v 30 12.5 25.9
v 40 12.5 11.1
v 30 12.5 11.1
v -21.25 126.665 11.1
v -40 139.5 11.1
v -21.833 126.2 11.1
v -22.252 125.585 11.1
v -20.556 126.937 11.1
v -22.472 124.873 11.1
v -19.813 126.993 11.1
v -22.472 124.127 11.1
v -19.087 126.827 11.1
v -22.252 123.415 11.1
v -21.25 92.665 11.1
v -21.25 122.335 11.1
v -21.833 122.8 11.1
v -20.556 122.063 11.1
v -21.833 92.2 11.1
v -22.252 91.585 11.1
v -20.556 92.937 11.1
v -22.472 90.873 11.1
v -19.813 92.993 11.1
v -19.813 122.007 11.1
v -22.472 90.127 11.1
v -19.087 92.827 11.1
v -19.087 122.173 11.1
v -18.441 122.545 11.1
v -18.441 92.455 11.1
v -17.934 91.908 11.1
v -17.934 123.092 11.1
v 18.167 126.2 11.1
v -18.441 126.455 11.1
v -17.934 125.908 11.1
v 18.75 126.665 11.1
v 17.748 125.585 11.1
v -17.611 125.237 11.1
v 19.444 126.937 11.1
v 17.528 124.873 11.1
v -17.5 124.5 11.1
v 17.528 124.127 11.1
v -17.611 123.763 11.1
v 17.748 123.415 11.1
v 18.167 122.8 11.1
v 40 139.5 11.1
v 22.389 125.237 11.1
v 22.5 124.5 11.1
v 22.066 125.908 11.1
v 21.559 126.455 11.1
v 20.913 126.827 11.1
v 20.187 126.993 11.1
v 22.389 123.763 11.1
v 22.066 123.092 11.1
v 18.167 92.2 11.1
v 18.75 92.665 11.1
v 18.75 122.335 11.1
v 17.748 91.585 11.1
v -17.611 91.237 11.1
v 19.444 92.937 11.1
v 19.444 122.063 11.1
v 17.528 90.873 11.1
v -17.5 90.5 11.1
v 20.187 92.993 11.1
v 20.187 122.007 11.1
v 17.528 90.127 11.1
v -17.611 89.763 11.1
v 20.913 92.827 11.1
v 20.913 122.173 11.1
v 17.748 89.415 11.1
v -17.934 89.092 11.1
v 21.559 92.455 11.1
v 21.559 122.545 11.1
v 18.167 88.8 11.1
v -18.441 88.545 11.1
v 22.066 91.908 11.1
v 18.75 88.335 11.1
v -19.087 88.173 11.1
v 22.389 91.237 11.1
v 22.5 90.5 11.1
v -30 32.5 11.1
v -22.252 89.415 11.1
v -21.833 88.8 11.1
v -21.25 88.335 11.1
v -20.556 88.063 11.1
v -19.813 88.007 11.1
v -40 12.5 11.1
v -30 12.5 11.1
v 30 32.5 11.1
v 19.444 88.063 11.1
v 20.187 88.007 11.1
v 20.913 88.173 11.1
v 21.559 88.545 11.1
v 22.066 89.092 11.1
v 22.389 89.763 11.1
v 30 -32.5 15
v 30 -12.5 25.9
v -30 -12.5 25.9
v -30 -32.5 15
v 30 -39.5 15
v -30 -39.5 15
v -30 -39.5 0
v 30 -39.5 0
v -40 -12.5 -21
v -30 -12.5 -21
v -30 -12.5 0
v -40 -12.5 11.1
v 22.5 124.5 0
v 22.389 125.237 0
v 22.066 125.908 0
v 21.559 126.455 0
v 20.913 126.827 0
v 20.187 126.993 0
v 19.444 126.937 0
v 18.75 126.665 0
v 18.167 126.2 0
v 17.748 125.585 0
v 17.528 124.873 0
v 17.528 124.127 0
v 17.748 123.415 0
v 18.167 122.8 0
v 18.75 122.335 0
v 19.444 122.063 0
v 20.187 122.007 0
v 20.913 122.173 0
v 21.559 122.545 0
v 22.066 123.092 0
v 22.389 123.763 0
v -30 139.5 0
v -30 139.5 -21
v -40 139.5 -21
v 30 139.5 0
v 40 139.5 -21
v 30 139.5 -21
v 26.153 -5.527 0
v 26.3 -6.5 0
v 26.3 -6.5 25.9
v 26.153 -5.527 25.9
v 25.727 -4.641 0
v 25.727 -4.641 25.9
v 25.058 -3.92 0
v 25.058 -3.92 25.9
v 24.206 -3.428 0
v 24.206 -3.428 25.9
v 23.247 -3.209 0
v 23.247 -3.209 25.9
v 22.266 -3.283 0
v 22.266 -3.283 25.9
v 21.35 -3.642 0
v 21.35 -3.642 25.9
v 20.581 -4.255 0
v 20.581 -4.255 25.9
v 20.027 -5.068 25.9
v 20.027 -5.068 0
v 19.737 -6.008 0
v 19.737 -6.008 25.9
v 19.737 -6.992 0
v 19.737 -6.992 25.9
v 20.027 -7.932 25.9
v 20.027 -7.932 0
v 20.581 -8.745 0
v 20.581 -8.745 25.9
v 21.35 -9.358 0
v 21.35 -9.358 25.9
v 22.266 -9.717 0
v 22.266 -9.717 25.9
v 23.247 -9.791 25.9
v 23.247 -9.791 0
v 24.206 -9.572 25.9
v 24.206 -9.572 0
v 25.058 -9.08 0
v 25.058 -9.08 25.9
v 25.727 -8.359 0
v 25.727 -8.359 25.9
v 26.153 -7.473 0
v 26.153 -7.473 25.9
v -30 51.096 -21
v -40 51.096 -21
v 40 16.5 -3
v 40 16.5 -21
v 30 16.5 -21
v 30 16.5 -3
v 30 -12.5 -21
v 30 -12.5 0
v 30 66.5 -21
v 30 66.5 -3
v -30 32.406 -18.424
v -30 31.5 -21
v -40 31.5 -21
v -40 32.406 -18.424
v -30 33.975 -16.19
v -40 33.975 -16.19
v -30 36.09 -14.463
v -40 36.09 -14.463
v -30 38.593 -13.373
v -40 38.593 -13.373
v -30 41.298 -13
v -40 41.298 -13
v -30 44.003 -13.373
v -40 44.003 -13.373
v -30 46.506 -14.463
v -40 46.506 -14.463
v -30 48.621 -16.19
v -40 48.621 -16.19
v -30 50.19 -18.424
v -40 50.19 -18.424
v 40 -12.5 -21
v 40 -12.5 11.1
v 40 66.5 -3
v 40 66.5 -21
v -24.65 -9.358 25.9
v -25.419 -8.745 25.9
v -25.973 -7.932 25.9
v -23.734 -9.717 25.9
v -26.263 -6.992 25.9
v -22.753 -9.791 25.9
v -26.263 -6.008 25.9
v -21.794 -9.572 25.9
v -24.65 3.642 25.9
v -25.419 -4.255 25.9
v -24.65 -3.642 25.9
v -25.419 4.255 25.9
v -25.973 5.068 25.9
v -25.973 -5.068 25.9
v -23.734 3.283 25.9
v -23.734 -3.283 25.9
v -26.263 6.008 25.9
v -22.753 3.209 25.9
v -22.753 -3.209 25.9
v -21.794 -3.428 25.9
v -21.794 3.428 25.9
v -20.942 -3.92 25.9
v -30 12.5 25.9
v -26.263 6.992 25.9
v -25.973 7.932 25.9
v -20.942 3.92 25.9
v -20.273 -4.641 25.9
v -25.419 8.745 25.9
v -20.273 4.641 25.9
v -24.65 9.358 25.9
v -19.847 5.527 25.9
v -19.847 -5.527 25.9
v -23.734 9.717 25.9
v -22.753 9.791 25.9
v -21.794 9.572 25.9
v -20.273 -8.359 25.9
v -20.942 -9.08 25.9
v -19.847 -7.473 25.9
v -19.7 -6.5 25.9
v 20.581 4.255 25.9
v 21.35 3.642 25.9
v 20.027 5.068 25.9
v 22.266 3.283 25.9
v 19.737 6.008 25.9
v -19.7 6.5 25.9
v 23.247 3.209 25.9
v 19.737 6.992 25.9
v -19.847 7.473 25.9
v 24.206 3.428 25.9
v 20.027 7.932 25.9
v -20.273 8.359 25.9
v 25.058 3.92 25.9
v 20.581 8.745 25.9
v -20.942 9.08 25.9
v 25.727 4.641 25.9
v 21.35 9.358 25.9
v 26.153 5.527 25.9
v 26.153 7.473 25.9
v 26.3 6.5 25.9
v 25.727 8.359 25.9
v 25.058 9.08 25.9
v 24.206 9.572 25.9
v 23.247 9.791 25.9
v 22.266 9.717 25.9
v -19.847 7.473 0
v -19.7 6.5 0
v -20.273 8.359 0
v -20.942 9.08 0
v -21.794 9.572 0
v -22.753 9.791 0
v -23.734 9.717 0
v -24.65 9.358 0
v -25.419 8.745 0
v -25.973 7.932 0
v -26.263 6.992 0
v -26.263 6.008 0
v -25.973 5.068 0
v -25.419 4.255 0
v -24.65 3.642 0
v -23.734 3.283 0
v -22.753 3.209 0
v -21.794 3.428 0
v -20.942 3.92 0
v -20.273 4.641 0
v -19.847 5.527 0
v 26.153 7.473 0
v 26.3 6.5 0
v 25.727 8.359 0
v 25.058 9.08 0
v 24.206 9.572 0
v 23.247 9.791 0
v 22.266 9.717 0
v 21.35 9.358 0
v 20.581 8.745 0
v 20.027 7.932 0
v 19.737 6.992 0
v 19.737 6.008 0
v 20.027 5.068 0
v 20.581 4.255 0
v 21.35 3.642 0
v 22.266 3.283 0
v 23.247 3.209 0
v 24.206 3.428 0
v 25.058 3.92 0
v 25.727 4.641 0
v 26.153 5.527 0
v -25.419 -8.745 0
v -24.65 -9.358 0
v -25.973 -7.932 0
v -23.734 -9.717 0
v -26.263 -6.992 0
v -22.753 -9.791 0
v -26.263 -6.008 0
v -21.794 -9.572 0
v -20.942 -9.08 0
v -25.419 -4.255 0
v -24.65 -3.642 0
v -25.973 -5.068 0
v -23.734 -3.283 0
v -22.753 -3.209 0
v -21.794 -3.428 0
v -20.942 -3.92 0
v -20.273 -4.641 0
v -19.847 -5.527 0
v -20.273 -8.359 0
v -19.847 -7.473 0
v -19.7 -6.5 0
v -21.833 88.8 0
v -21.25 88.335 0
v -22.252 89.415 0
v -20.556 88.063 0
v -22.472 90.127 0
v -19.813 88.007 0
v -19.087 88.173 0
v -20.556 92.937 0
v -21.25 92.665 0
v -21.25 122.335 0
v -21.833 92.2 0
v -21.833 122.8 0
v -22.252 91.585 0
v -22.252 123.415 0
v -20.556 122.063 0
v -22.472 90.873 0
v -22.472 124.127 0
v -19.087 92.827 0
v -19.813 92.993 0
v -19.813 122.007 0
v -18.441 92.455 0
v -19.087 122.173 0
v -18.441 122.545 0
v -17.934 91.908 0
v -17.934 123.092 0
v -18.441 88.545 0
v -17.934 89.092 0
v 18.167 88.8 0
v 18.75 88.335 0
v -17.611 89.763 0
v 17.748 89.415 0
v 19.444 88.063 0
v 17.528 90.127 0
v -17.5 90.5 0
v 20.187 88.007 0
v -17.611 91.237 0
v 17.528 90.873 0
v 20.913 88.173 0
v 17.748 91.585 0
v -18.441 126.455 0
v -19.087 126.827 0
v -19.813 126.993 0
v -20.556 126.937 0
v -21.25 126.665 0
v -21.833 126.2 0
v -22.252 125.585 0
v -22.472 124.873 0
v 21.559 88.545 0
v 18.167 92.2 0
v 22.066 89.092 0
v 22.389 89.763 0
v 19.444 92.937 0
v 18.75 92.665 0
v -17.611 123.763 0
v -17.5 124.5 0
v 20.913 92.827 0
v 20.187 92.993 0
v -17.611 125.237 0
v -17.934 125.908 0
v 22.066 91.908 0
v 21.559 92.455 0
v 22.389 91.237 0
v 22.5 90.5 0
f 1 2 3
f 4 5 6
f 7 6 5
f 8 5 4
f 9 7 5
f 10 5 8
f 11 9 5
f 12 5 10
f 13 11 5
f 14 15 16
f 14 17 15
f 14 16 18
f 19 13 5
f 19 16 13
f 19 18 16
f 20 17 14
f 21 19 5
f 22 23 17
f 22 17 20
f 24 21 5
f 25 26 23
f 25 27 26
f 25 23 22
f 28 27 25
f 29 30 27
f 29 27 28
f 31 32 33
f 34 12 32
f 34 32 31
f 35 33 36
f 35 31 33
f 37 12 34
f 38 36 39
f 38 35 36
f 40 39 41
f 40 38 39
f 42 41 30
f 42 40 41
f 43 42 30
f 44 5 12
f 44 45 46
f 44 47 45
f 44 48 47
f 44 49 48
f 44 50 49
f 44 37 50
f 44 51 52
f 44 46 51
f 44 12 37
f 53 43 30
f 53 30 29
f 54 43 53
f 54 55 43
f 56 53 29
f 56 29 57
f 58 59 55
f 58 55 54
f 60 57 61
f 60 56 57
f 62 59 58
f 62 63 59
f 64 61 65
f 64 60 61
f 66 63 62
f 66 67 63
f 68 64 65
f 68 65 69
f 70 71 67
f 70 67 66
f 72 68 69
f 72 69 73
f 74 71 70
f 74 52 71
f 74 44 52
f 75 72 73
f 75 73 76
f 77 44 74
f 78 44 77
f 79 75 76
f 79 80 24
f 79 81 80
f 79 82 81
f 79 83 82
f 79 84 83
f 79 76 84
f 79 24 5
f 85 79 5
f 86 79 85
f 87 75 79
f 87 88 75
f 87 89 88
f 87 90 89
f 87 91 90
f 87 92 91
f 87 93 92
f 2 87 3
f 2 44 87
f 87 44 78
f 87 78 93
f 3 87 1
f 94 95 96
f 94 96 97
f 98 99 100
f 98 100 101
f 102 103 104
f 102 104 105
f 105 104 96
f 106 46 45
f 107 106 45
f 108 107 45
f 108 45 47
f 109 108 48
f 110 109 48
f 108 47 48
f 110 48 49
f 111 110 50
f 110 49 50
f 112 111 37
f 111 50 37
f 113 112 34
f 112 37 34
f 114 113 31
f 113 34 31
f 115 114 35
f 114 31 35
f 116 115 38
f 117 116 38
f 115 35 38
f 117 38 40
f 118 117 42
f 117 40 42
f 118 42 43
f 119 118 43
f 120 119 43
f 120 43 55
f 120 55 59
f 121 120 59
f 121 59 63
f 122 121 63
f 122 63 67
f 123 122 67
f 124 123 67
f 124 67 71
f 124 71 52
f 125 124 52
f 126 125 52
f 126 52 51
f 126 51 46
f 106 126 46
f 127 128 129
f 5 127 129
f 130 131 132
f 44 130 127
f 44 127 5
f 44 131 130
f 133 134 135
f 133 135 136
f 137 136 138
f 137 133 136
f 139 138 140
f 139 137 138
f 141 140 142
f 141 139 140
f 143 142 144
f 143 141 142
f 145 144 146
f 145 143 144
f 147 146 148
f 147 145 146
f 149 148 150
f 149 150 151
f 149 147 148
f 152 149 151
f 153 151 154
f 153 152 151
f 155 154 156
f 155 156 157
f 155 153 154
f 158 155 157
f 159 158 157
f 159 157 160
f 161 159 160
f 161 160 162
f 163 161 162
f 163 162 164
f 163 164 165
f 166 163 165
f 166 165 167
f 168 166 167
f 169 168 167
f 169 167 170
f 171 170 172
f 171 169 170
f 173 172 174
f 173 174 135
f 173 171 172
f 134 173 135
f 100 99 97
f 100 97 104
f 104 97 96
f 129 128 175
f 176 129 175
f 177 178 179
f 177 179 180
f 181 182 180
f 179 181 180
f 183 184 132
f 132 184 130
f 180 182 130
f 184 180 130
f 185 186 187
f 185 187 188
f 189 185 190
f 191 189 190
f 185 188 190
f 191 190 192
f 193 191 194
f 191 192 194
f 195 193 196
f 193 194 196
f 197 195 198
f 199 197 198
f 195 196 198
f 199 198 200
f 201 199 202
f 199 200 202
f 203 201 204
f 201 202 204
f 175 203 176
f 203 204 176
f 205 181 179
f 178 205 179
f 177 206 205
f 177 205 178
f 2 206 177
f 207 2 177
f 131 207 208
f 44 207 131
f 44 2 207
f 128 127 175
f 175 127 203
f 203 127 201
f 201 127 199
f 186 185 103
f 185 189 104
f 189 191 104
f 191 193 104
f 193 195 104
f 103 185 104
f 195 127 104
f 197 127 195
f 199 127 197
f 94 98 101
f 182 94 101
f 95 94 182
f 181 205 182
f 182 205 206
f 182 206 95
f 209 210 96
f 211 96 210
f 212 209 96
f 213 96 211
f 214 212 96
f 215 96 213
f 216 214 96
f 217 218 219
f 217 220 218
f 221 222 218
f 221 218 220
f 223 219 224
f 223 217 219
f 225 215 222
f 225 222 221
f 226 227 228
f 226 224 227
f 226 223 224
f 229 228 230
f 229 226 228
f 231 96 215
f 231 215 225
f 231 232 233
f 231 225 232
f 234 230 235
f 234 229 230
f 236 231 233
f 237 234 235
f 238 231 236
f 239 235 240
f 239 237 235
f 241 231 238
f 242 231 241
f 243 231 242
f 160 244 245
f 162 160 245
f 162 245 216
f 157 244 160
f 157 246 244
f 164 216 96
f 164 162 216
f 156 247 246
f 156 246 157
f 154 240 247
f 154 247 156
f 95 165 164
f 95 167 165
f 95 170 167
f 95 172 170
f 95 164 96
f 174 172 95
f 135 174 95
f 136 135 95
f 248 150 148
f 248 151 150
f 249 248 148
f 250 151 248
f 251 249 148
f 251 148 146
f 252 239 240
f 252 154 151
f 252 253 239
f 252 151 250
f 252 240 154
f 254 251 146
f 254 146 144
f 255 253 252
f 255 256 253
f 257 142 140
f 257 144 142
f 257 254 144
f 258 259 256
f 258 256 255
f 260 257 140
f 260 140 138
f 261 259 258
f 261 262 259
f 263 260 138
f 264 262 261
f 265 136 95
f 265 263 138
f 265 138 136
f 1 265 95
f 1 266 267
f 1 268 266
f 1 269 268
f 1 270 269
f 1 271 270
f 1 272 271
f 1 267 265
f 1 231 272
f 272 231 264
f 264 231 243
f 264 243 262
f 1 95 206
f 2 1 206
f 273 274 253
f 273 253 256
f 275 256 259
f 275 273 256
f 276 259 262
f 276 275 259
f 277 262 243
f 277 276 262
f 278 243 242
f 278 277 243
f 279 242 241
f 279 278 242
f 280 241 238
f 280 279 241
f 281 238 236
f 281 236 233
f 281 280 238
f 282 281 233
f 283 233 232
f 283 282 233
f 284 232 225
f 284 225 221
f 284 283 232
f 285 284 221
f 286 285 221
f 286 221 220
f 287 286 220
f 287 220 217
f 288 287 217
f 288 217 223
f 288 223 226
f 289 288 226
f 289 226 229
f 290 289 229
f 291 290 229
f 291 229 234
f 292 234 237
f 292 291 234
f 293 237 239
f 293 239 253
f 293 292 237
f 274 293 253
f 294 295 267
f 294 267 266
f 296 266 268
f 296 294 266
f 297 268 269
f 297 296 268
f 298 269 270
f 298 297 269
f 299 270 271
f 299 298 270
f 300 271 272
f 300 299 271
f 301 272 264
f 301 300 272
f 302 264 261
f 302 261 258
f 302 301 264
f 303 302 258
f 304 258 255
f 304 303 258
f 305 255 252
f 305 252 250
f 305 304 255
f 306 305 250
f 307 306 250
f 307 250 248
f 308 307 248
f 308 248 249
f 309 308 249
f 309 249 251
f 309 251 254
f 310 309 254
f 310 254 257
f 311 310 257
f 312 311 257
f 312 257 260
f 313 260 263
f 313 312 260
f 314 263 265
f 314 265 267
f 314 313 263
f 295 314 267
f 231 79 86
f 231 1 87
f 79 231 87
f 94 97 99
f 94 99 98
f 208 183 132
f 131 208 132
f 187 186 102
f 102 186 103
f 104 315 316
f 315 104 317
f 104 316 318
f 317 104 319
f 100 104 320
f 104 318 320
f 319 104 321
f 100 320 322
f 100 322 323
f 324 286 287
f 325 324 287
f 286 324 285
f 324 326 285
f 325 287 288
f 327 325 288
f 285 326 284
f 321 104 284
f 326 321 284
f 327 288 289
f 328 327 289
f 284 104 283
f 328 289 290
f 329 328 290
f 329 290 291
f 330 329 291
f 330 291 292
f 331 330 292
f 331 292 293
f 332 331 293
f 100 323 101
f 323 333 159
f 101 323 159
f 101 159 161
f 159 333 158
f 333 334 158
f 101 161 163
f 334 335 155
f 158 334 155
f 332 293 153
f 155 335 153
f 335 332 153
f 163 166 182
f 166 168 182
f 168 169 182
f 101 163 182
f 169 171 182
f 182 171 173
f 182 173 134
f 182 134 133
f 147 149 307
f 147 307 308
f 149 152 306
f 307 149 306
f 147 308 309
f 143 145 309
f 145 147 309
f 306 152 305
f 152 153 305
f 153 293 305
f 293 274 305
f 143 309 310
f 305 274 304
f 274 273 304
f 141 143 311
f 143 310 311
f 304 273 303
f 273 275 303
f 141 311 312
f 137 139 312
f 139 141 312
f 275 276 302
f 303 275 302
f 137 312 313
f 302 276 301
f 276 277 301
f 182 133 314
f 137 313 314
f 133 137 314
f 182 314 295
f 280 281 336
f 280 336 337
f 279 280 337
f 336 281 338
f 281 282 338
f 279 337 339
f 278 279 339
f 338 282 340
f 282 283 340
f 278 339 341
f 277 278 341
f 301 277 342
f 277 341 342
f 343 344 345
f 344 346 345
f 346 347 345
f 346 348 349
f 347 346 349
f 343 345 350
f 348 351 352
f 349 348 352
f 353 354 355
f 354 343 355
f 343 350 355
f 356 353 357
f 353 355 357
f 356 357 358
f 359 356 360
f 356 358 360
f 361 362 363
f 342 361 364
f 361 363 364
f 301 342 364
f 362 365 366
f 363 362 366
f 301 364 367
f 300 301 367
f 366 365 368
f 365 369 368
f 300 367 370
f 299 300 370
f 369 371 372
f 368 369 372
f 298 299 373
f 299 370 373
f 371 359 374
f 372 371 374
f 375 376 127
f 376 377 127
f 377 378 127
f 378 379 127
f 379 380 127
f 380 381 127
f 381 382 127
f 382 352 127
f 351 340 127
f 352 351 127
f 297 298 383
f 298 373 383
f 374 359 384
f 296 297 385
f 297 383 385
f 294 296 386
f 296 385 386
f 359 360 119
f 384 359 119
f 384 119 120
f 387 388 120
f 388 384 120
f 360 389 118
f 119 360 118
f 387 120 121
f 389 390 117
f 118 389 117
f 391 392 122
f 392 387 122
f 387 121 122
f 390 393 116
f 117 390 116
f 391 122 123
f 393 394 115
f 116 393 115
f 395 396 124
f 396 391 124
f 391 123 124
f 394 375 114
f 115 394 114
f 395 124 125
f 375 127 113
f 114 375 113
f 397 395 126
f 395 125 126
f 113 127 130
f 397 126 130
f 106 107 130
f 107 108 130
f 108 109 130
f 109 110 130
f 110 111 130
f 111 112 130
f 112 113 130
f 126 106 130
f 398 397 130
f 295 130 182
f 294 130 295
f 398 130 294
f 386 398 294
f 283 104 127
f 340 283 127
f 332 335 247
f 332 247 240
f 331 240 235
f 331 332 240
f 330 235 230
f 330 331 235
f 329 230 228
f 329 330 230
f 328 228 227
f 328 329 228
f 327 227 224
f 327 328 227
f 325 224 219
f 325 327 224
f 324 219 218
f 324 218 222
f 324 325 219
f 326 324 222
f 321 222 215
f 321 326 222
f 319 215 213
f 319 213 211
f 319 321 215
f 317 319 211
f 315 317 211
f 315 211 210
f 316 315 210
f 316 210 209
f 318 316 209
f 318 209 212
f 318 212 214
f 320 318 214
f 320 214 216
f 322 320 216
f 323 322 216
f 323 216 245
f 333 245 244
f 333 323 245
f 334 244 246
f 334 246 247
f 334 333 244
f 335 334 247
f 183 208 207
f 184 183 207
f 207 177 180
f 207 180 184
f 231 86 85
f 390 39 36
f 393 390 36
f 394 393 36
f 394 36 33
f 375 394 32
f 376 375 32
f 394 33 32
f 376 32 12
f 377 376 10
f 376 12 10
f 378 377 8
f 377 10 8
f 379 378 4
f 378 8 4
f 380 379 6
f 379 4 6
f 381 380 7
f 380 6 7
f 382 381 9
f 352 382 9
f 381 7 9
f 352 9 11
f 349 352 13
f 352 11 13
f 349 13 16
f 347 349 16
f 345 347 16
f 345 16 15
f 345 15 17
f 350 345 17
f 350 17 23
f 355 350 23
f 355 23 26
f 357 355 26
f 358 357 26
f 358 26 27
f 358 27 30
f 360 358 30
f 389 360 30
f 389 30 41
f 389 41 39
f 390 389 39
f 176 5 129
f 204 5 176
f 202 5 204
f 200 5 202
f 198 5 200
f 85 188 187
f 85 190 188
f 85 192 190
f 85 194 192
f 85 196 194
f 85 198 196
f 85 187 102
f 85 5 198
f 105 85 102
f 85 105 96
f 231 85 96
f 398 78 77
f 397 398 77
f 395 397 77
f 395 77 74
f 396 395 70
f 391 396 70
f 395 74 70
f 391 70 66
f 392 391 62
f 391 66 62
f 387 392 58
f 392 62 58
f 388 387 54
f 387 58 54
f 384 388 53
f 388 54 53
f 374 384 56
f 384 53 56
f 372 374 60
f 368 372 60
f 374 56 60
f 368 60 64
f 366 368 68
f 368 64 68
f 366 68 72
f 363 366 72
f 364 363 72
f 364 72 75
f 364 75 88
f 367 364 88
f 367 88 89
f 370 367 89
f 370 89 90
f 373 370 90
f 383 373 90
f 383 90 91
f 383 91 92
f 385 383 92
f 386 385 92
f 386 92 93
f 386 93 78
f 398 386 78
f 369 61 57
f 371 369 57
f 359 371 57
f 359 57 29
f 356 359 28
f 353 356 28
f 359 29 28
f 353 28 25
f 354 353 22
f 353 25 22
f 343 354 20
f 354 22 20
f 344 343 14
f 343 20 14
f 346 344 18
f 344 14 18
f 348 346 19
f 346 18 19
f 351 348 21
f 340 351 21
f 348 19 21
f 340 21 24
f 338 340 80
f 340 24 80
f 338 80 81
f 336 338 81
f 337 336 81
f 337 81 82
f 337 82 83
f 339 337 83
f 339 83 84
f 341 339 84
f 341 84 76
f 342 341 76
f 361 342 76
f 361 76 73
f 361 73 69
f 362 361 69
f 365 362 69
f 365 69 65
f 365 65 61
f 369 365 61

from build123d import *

# Parameters (mm, degrees)
SKETCH_W        = 60
SKETCH_H        = 25
SKETCH_R        = 3.3
PAD_DEPTH       = 25.9
SKETCH001_W     = 60
SKETCH001_H     = 11.1
PAD001_DEPTH    = 127
SKETCH002_R     = 2.5
POCKET_DEPTH    = 11.101
PAD002_DEPTH    = 60
SKETCH004_W     = 152
SKETCH004_H     = 32.1
PAD003_DEPTH    = 10
SKETCH005_W     = 152
SKETCH005_H     = 32.1
PAD004_DEPTH    = 10
PAD005_DEPTH    = 25
SKETCH007_W     = 50
SKETCH007_H     = 18
POCKET001_DEPTH = 10
POCKET002_DEPTH = 10
SKETCH009_W     = 60
SKETCH009_H     = 15
PAD006_DEPTH    = 27
PAD007_DEPTH    = 60


with BuildPart() as part:
    # Sketch → Pad (new body)
    with BuildSketch(Plane.XY):
        Rectangle(SKETCH_W, SKETCH_H)
        with Locations((-23, 6.5)):
            Circle(SKETCH_R, mode=Mode.SUBTRACT)
        with Locations((-23, -6.5)):
            Circle(SKETCH_R, mode=Mode.SUBTRACT)
        with Locations((23, -6.5)):
            Circle(SKETCH_R, mode=Mode.SUBTRACT)
        with Locations((23, 6.5)):
            Circle(SKETCH_R, mode=Mode.SUBTRACT)
    extrude(amount=PAD_DEPTH)

    # Sketch001 (on Face1 of Pad) → Pad001 (join)
    with BuildSketch(Plane(origin=(0, 12.5, 0), x_dir=(-1, 0, 0), z_dir=(0, 1, 0))):
        with Locations((0, 5.55)):
            Rectangle(SKETCH001_W, SKETCH001_H)
    extrude(amount=PAD001_DEPTH)

    # Sketch002 (on Face2 of Pad001) → Pocket (cut, through all)
    with BuildSketch(Plane.XY.offset(11.1)):
        with Locations((-20, 124.5)):
            Circle(SKETCH002_R)
        with Locations((20, 124.5)):
            Circle(SKETCH002_R)
        with Locations((-20, 90.5)):
            Circle(SKETCH002_R)
        with Locations((20, 90.5)):
            Circle(SKETCH002_R)
    extrude(amount=-POCKET_DEPTH, mode=Mode.SUBTRACT)

    # Sketch003 (on Face6 of Pocket) → Pad002 (join)
    with BuildSketch(Plane.YZ.offset(30)):
        Polygon((12.5, 25.9), (32.5, 11.1), (12.5, 0), align=None)
    extrude(amount=-PAD002_DEPTH)

    # Sketch004 (on Face7 of Pad002) → Pad003 (join)
    with BuildSketch(Plane.YZ.offset(30)):
        with Locations((63.5, -4.95)):
            Rectangle(SKETCH004_W, SKETCH004_H)
    extrude(amount=PAD003_DEPTH)

    # Sketch005 (on Face20 of Pad003) → Pad004 (join)
    with BuildSketch(Plane(origin=(-30, 0, 0), x_dir=(0, -1, 0), z_dir=(-1, 0, 0))):
        with Locations((-63.5, -4.95)):
            Rectangle(SKETCH005_W, SKETCH005_H)
    extrude(amount=PAD004_DEPTH)

    # Sketch006 (on Face3 of Pad004) → Pad005 (join)
    with BuildSketch(Plane.XZ.offset(12.5)):
        Polygon((40, 11.1), (30, 11.1), (30, 25.9), align=None)
        Polygon((-30, 25.9), (-30, 11.1), (-40, 11.1), align=None)
    extrude(amount=-PAD005_DEPTH)

    # Sketch007 (on Face5 of Pad005) → Pocket001 (cut)
    with BuildSketch(Plane.YZ.offset(40)):
        with Locations((41.5, -12)):
            Rectangle(SKETCH007_W, SKETCH007_H)
    extrude(amount=-POCKET001_DEPTH, mode=Mode.SUBTRACT)

    # Sketch008 (on Face25 of Pocket001) → Pocket002 (cut)
    with BuildSketch(Plane(origin=(-40, 0, 0), x_dir=(0, -1, 0), z_dir=(-1, 0, 0))):
        with BuildLine():
            ThreePointArc((-31.5, -21), (-41.297959, -13), (-51.095918, -21))
            Line((-51.095918, -21), (-31.5, -21))
        make_face()
    extrude(amount=-POCKET002_DEPTH, mode=Mode.SUBTRACT)

    # Sketch009 (on Face29 of Pocket002) → Pad006 (join)
    with BuildSketch(Plane.XZ.offset(12.5)):
        with Locations((0, 7.5)):
            Rectangle(SKETCH009_W, SKETCH009_H)
    extrude(amount=PAD006_DEPTH)

    # Sketch010 (on Face29 of Pad006) → Pad007 (join)
    with BuildSketch(Plane.YZ.offset(30)):
        Polygon((-32.5, 15), (-12.5, 15), (-12.5, 25.9), align=None)
    extrude(amount=-PAD007_DEPTH)


solid = part.part
